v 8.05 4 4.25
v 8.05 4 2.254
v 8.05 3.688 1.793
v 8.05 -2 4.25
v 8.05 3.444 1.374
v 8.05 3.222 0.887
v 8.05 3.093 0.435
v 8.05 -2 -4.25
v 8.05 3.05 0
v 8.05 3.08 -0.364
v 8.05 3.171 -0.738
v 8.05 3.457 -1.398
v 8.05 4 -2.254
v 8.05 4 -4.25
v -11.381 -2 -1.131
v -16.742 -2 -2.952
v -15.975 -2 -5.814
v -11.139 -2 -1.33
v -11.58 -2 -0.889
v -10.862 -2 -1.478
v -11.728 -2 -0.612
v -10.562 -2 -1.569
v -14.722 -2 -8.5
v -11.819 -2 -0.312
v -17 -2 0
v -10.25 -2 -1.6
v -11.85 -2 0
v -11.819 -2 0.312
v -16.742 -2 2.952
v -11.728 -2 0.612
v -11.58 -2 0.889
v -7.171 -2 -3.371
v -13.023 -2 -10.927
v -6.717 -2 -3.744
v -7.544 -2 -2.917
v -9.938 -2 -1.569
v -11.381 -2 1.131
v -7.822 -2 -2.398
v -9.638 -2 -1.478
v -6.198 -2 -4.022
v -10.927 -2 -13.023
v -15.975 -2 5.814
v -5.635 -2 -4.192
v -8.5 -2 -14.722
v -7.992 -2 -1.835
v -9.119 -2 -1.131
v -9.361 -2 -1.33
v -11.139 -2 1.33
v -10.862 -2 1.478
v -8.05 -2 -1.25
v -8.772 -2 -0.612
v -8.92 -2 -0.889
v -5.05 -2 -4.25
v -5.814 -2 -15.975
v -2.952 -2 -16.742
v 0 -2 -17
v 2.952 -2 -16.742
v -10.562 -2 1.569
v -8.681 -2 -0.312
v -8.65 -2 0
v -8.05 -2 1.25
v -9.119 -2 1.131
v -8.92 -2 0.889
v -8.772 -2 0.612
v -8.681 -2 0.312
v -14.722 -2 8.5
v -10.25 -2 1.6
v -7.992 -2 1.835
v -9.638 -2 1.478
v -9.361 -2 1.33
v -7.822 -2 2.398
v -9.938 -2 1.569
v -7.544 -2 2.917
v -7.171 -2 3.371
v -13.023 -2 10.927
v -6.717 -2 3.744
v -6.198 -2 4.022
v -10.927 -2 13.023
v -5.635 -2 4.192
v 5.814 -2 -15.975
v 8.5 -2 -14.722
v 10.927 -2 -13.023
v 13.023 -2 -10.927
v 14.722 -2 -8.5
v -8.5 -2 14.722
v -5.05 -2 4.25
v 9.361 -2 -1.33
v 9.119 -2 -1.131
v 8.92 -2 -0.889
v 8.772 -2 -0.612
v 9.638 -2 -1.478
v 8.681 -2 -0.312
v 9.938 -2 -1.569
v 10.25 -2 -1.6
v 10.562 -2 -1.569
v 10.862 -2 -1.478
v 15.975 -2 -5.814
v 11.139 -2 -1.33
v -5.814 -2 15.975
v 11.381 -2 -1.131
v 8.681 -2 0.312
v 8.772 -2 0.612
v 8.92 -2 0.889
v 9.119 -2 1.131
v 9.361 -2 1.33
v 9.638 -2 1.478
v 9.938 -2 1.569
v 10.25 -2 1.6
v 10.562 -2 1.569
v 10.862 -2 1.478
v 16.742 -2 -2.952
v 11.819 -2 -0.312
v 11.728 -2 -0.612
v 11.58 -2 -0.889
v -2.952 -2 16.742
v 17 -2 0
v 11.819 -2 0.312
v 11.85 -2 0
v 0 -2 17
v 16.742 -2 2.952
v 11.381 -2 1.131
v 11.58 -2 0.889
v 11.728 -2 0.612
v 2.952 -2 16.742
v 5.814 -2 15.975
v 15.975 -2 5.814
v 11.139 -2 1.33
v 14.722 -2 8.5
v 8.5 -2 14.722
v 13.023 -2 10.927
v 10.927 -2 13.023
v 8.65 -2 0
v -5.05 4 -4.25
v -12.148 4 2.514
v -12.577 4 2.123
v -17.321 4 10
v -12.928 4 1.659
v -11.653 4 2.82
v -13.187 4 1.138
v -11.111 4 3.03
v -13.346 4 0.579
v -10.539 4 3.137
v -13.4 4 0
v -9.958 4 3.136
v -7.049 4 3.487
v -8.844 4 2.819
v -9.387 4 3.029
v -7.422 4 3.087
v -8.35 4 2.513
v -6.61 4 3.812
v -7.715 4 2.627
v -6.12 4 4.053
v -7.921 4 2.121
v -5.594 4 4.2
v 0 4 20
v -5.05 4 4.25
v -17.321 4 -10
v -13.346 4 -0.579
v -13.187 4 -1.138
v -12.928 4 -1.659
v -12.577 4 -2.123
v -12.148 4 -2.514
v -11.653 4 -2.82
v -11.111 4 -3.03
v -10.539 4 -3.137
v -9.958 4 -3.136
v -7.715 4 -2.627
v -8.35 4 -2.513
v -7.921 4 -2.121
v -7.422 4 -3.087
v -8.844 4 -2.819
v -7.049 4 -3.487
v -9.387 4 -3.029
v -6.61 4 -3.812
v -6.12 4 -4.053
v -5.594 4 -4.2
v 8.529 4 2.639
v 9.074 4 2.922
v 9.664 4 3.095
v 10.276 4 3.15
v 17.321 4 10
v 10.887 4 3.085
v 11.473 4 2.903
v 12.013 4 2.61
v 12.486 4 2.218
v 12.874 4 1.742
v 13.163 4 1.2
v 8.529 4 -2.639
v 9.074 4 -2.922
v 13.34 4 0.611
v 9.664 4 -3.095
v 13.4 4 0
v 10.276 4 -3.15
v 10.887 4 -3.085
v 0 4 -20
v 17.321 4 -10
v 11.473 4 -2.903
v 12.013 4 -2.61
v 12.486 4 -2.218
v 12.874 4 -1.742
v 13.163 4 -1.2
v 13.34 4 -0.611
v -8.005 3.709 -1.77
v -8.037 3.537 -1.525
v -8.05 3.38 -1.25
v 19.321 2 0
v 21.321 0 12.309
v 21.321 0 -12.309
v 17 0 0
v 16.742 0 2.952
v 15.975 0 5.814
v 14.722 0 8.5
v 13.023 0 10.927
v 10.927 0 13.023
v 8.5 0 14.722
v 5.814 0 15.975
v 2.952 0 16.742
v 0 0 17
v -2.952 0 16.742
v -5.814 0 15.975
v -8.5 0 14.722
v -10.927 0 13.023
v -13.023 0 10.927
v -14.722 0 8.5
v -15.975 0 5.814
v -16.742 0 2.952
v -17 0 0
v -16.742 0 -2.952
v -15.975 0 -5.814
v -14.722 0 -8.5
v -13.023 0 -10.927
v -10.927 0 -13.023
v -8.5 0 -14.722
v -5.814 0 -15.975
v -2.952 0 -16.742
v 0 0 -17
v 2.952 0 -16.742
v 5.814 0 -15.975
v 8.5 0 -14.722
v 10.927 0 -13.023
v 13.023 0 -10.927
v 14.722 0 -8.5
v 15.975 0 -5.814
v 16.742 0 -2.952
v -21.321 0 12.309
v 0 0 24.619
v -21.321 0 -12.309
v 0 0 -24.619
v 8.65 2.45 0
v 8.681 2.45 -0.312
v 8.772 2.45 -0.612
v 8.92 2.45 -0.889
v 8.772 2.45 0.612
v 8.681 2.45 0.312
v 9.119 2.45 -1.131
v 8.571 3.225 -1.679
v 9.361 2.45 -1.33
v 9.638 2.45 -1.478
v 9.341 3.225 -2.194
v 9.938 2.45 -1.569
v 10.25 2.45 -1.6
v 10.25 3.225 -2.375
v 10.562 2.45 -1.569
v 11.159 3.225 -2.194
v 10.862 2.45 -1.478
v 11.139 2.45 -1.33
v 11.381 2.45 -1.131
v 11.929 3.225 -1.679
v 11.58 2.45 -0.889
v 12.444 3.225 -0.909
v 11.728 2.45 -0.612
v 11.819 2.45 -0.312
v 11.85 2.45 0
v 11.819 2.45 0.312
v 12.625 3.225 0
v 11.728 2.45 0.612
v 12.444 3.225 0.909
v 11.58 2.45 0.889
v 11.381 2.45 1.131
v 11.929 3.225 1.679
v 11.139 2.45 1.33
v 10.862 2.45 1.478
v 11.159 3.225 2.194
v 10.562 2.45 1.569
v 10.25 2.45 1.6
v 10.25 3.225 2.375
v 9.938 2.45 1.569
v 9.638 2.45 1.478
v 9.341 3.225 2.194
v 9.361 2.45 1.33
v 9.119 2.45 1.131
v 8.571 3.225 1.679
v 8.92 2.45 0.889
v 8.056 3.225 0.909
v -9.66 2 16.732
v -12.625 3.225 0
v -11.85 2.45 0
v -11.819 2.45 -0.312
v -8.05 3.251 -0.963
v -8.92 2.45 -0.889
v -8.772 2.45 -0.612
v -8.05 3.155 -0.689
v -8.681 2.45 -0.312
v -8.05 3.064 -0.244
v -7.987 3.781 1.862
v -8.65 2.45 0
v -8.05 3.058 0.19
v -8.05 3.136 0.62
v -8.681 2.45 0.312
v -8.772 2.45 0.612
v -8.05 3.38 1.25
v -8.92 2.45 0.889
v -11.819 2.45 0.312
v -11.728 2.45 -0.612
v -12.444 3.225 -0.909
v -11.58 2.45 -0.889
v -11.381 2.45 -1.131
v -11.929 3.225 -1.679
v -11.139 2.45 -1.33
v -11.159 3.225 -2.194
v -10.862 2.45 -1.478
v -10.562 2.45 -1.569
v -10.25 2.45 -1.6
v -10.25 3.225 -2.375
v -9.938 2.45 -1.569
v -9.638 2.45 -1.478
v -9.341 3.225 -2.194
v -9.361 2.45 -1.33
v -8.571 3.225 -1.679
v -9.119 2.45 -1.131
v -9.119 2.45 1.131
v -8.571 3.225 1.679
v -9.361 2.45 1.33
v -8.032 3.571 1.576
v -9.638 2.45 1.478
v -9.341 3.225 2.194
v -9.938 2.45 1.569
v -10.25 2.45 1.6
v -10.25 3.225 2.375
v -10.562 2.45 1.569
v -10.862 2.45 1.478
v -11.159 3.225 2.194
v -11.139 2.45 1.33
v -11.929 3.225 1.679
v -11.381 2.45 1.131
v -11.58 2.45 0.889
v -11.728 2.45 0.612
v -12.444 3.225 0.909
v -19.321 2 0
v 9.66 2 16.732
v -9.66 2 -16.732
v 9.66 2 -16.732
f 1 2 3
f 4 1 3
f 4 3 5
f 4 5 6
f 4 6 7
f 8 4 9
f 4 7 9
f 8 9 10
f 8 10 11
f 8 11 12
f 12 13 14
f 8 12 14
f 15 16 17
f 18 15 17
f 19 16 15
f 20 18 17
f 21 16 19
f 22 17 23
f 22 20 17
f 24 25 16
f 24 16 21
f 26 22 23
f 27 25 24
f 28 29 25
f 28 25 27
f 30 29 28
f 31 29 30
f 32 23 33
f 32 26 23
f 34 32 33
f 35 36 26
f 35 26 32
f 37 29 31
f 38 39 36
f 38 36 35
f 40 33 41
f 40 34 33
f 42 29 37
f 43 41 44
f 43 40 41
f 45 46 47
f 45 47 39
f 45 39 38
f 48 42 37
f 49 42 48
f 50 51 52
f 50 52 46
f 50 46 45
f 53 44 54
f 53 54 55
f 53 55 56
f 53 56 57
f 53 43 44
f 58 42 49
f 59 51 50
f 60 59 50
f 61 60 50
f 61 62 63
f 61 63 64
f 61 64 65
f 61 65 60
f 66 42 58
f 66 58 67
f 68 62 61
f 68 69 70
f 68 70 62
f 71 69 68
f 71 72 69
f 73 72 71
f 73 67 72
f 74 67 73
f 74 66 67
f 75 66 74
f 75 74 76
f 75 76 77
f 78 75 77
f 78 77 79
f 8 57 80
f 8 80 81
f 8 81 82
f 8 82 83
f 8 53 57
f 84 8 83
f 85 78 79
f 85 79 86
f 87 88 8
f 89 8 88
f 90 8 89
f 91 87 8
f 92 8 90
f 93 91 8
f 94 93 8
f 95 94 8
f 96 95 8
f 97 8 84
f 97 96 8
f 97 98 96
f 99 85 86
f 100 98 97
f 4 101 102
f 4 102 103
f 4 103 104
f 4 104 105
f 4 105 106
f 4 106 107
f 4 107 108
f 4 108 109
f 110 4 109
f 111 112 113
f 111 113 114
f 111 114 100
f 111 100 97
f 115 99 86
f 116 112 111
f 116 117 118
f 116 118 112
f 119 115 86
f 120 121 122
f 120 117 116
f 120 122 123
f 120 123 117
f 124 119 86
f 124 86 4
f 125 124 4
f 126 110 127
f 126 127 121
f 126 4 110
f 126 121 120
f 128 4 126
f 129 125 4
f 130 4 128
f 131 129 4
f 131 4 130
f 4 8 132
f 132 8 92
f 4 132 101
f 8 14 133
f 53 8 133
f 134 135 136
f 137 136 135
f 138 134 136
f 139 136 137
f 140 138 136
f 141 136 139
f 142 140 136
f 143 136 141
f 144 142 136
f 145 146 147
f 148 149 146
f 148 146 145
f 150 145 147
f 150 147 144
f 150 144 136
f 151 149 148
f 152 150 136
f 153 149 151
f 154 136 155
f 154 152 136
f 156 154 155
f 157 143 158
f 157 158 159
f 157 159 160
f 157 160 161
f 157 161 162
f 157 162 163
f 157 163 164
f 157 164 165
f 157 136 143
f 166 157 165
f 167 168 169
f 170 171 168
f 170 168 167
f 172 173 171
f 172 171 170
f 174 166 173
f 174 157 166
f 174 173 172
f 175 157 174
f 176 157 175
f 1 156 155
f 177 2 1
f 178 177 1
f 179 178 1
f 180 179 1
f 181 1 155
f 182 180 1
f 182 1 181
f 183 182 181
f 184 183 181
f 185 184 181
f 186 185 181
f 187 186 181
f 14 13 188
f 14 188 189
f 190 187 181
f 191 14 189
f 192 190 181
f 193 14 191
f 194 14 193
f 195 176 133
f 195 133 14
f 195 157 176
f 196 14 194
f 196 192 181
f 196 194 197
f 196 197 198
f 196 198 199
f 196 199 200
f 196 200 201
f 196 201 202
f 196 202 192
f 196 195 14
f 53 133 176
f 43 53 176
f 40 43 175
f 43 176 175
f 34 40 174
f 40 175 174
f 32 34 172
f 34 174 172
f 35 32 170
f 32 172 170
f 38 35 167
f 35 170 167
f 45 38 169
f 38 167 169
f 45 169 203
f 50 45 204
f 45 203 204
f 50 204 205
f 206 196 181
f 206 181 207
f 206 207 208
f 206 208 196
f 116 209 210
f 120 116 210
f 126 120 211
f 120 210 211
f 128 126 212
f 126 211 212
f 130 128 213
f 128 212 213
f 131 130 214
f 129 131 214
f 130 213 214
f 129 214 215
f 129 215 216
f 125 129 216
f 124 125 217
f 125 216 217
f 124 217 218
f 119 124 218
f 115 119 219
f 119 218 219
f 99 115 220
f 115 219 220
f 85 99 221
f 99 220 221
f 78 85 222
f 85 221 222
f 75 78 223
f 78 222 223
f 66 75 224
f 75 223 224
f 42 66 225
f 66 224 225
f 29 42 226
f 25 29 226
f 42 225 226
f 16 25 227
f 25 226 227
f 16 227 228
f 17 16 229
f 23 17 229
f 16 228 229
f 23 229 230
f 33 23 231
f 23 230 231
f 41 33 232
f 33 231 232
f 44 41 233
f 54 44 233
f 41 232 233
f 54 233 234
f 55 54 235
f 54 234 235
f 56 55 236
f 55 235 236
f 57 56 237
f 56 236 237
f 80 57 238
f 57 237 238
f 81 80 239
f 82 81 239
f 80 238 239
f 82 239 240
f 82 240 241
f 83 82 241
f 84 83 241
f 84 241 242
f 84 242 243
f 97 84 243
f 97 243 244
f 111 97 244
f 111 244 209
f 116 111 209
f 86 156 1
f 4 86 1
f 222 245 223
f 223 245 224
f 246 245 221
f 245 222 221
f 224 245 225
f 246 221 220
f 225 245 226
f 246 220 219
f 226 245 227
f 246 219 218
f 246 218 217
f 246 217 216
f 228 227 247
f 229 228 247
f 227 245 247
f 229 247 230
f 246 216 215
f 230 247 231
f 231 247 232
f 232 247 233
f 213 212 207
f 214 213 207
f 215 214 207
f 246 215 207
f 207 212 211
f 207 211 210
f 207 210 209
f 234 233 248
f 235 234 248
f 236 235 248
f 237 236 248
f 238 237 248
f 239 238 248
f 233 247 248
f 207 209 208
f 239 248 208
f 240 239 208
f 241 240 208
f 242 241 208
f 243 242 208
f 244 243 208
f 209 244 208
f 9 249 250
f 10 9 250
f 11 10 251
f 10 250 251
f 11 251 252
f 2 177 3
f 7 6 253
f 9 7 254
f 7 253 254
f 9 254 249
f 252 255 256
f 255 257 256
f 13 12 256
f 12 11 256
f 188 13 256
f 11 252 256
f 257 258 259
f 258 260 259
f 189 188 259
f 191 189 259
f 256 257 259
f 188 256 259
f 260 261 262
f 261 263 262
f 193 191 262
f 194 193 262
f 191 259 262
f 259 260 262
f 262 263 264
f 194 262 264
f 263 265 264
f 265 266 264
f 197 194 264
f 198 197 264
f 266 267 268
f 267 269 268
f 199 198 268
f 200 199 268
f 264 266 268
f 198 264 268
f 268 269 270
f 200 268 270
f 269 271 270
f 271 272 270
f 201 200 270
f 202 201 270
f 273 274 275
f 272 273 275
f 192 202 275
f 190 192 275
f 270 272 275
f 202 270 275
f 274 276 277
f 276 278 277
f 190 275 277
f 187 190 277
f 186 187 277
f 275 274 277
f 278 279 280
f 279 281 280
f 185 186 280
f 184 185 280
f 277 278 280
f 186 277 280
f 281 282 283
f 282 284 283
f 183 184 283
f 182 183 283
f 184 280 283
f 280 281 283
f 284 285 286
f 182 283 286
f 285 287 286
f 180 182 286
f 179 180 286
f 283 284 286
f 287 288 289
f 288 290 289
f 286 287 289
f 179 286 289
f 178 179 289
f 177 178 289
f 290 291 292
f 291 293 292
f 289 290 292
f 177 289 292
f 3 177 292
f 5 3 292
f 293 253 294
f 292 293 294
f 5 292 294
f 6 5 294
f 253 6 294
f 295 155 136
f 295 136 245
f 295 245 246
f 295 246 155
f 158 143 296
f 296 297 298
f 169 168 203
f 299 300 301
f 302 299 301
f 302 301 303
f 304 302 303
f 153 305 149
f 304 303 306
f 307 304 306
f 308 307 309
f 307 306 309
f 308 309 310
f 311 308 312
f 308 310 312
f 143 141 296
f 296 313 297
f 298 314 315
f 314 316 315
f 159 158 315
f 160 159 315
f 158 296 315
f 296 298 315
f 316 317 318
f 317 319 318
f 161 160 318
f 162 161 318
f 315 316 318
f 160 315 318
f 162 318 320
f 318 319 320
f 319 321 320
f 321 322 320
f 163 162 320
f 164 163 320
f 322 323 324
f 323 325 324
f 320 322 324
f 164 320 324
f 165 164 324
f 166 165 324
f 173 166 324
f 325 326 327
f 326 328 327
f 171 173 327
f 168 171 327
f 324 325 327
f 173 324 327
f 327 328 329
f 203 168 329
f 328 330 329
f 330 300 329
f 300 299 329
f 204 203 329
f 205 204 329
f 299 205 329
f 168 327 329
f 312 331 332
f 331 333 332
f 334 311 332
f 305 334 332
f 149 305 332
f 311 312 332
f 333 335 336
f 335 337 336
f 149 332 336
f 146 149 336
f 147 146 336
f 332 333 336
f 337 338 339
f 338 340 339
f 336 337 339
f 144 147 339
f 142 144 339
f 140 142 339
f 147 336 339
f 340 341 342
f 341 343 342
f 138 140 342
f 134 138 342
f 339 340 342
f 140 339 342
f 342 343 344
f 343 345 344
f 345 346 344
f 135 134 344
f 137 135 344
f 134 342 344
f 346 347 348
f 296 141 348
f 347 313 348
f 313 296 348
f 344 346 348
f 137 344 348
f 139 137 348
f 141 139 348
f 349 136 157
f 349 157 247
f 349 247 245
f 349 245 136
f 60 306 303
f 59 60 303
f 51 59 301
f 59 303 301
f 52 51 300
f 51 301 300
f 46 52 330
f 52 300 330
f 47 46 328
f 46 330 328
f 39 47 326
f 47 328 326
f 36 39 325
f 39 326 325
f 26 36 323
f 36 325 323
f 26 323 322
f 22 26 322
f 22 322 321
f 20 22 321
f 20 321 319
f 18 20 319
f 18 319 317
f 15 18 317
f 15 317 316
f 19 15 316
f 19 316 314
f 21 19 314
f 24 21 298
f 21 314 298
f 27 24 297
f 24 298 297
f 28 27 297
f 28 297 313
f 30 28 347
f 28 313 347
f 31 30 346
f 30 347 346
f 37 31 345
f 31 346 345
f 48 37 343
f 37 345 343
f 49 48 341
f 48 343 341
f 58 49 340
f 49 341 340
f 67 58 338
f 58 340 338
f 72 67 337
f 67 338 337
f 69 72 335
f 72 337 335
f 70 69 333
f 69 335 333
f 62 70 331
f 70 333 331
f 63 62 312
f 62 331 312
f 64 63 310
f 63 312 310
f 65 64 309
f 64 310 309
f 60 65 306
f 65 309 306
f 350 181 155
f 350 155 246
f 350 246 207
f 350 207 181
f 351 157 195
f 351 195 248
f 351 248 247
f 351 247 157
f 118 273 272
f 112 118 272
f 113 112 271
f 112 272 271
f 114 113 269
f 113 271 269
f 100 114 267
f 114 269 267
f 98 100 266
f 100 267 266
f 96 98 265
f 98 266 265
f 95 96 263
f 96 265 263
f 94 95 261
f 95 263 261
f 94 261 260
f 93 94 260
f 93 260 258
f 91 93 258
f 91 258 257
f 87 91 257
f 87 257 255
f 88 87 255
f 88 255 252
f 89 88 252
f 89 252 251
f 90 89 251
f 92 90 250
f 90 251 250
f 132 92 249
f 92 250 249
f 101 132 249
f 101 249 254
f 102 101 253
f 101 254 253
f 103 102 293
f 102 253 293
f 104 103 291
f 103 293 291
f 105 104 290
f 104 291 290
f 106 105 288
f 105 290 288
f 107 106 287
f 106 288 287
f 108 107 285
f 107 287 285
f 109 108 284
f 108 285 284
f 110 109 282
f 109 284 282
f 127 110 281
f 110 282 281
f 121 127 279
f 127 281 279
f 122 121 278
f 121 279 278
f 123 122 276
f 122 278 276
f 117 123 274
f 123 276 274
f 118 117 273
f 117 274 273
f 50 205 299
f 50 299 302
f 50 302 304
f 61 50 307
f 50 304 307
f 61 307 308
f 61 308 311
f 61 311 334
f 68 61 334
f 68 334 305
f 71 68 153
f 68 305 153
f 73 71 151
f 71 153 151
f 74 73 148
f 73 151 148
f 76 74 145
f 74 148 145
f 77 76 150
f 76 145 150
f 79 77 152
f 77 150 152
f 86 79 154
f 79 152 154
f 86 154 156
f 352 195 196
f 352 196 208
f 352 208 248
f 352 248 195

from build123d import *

# Parameters (mm, degrees)
SKETCH1_R                                           = 26
BOSS_EXTRUDE1_DEPTH                                 = 4
SKETCH3_R                                           = 17
BOSS_EXTRUDE2_DEPTH                                 = 2
CUT_EXTRUDE1_DEPTH                                  = 20
SKETCH4_R                                           = 1.6
CUT_EXTRUDE2_DEPTH                                  = 10
SKETCH6_OUTSIDE_W                                   = 88.756
SKETCH6_OUTSIDE_H                                   = 88.756
CUT_EXTRUDE3_DEPTH                                  = 10
CUT_EXTRUDE3_TAPER                                  = 45
CSK_FOR_M3_COUNTERSUNK_FLAT_HEAD_SCREW2_D           = 3.2
CSK_FOR_M3_COUNTERSUNK_FLAT_HEAD_SCREW2_CSINK_D     = 6.3
CSK_FOR_M3_COUNTERSUNK_FLAT_HEAD_SCREW2_CSINK_ANGLE = 90


with BuildPart() as part:
    # Sketch1 → Boss-Extrude1 (new body)
    with BuildSketch(Plane(origin=(0, 0, 0), x_dir=(1, 0, 0), z_dir=(0, 1, 0))):
        Circle(SKETCH1_R)
    extrude(amount=BOSS_EXTRUDE1_DEPTH)

    # Sketch3 → Boss-Extrude2 (add)
    with BuildSketch(Plane.XZ):
        Circle(SKETCH3_R)
    extrude(amount=BOSS_EXTRUDE2_DEPTH)

    # Sketch2 → Cut-Extrude1 (cut)
    with BuildSketch(Plane(origin=(0, 4, 0), x_dir=(1, 0, 0), z_dir=(0, 1, 0))):
        with BuildLine():
            Line((-5.05, -4.25), (8.05, -4.25))
            Line((8.05, -4.25), (8.05, 4.25))
            Line((8.05, 4.25), (-5.05, 4.25))
            ThreePointArc((-5.05, 4.25), (-7.171320344, 3.371320344), (-8.05, 1.25))
            Line((-8.05, 1.25), (-8.05, -1.25))
            ThreePointArc((-8.05, -1.25), (-7.171320344, -3.371320344), (-5.05, -4.25))
        make_face()
    extrude(amount=-CUT_EXTRUDE1_DEPTH, mode=Mode.SUBTRACT)

    # Sketch4 → Cut-Extrude2 (cut)
    with BuildSketch(Plane(origin=(0, 4, 0), x_dir=(1, 0, 0), z_dir=(0, 1, 0))):
        with Locations((-10.25, 0)):
            Circle(SKETCH4_R)
        with Locations((10.25, 0)):
            Circle(SKETCH4_R)
    extrude(amount=-CUT_EXTRUDE2_DEPTH, mode=Mode.SUBTRACT)

    # Sketch6 outside → Cut-Extrude3 (cut)
    with BuildSketch(Plane(origin=(0, 4, 0), x_dir=(1, 0, 0), z_dir=(0, 1, 0))):
        Rectangle(SKETCH6_OUTSIDE_W, SKETCH6_OUTSIDE_H)
        Polygon((0, 20), (-17.320508076, 10), (-17.320508076, -10), (0, -20), (17.320508076, -10), (17.320508076, 10), align=None, mode=Mode.SUBTRACT)
    extrude(amount=-CUT_EXTRUDE3_DEPTH, taper=CUT_EXTRUDE3_TAPER, mode=Mode.SUBTRACT)

    # CSK for M3 Countersunk Flat Head Screw2 (through all)
    with Locations(Plane(origin=(0, 4, 0), x_dir=(1, 0, 0), z_dir=(0, 1, 0))):
        with Locations((-10.25, 0), (10.25, 0)):
            CounterSinkHole(CSK_FOR_M3_COUNTERSUNK_FLAT_HEAD_SCREW2_D / 2, CSK_FOR_M3_COUNTERSUNK_FLAT_HEAD_SCREW2_CSINK_D / 2, counter_sink_angle=CSK_FOR_M3_COUNTERSUNK_FLAT_HEAD_SCREW2_CSINK_ANGLE)


solid = part.part
